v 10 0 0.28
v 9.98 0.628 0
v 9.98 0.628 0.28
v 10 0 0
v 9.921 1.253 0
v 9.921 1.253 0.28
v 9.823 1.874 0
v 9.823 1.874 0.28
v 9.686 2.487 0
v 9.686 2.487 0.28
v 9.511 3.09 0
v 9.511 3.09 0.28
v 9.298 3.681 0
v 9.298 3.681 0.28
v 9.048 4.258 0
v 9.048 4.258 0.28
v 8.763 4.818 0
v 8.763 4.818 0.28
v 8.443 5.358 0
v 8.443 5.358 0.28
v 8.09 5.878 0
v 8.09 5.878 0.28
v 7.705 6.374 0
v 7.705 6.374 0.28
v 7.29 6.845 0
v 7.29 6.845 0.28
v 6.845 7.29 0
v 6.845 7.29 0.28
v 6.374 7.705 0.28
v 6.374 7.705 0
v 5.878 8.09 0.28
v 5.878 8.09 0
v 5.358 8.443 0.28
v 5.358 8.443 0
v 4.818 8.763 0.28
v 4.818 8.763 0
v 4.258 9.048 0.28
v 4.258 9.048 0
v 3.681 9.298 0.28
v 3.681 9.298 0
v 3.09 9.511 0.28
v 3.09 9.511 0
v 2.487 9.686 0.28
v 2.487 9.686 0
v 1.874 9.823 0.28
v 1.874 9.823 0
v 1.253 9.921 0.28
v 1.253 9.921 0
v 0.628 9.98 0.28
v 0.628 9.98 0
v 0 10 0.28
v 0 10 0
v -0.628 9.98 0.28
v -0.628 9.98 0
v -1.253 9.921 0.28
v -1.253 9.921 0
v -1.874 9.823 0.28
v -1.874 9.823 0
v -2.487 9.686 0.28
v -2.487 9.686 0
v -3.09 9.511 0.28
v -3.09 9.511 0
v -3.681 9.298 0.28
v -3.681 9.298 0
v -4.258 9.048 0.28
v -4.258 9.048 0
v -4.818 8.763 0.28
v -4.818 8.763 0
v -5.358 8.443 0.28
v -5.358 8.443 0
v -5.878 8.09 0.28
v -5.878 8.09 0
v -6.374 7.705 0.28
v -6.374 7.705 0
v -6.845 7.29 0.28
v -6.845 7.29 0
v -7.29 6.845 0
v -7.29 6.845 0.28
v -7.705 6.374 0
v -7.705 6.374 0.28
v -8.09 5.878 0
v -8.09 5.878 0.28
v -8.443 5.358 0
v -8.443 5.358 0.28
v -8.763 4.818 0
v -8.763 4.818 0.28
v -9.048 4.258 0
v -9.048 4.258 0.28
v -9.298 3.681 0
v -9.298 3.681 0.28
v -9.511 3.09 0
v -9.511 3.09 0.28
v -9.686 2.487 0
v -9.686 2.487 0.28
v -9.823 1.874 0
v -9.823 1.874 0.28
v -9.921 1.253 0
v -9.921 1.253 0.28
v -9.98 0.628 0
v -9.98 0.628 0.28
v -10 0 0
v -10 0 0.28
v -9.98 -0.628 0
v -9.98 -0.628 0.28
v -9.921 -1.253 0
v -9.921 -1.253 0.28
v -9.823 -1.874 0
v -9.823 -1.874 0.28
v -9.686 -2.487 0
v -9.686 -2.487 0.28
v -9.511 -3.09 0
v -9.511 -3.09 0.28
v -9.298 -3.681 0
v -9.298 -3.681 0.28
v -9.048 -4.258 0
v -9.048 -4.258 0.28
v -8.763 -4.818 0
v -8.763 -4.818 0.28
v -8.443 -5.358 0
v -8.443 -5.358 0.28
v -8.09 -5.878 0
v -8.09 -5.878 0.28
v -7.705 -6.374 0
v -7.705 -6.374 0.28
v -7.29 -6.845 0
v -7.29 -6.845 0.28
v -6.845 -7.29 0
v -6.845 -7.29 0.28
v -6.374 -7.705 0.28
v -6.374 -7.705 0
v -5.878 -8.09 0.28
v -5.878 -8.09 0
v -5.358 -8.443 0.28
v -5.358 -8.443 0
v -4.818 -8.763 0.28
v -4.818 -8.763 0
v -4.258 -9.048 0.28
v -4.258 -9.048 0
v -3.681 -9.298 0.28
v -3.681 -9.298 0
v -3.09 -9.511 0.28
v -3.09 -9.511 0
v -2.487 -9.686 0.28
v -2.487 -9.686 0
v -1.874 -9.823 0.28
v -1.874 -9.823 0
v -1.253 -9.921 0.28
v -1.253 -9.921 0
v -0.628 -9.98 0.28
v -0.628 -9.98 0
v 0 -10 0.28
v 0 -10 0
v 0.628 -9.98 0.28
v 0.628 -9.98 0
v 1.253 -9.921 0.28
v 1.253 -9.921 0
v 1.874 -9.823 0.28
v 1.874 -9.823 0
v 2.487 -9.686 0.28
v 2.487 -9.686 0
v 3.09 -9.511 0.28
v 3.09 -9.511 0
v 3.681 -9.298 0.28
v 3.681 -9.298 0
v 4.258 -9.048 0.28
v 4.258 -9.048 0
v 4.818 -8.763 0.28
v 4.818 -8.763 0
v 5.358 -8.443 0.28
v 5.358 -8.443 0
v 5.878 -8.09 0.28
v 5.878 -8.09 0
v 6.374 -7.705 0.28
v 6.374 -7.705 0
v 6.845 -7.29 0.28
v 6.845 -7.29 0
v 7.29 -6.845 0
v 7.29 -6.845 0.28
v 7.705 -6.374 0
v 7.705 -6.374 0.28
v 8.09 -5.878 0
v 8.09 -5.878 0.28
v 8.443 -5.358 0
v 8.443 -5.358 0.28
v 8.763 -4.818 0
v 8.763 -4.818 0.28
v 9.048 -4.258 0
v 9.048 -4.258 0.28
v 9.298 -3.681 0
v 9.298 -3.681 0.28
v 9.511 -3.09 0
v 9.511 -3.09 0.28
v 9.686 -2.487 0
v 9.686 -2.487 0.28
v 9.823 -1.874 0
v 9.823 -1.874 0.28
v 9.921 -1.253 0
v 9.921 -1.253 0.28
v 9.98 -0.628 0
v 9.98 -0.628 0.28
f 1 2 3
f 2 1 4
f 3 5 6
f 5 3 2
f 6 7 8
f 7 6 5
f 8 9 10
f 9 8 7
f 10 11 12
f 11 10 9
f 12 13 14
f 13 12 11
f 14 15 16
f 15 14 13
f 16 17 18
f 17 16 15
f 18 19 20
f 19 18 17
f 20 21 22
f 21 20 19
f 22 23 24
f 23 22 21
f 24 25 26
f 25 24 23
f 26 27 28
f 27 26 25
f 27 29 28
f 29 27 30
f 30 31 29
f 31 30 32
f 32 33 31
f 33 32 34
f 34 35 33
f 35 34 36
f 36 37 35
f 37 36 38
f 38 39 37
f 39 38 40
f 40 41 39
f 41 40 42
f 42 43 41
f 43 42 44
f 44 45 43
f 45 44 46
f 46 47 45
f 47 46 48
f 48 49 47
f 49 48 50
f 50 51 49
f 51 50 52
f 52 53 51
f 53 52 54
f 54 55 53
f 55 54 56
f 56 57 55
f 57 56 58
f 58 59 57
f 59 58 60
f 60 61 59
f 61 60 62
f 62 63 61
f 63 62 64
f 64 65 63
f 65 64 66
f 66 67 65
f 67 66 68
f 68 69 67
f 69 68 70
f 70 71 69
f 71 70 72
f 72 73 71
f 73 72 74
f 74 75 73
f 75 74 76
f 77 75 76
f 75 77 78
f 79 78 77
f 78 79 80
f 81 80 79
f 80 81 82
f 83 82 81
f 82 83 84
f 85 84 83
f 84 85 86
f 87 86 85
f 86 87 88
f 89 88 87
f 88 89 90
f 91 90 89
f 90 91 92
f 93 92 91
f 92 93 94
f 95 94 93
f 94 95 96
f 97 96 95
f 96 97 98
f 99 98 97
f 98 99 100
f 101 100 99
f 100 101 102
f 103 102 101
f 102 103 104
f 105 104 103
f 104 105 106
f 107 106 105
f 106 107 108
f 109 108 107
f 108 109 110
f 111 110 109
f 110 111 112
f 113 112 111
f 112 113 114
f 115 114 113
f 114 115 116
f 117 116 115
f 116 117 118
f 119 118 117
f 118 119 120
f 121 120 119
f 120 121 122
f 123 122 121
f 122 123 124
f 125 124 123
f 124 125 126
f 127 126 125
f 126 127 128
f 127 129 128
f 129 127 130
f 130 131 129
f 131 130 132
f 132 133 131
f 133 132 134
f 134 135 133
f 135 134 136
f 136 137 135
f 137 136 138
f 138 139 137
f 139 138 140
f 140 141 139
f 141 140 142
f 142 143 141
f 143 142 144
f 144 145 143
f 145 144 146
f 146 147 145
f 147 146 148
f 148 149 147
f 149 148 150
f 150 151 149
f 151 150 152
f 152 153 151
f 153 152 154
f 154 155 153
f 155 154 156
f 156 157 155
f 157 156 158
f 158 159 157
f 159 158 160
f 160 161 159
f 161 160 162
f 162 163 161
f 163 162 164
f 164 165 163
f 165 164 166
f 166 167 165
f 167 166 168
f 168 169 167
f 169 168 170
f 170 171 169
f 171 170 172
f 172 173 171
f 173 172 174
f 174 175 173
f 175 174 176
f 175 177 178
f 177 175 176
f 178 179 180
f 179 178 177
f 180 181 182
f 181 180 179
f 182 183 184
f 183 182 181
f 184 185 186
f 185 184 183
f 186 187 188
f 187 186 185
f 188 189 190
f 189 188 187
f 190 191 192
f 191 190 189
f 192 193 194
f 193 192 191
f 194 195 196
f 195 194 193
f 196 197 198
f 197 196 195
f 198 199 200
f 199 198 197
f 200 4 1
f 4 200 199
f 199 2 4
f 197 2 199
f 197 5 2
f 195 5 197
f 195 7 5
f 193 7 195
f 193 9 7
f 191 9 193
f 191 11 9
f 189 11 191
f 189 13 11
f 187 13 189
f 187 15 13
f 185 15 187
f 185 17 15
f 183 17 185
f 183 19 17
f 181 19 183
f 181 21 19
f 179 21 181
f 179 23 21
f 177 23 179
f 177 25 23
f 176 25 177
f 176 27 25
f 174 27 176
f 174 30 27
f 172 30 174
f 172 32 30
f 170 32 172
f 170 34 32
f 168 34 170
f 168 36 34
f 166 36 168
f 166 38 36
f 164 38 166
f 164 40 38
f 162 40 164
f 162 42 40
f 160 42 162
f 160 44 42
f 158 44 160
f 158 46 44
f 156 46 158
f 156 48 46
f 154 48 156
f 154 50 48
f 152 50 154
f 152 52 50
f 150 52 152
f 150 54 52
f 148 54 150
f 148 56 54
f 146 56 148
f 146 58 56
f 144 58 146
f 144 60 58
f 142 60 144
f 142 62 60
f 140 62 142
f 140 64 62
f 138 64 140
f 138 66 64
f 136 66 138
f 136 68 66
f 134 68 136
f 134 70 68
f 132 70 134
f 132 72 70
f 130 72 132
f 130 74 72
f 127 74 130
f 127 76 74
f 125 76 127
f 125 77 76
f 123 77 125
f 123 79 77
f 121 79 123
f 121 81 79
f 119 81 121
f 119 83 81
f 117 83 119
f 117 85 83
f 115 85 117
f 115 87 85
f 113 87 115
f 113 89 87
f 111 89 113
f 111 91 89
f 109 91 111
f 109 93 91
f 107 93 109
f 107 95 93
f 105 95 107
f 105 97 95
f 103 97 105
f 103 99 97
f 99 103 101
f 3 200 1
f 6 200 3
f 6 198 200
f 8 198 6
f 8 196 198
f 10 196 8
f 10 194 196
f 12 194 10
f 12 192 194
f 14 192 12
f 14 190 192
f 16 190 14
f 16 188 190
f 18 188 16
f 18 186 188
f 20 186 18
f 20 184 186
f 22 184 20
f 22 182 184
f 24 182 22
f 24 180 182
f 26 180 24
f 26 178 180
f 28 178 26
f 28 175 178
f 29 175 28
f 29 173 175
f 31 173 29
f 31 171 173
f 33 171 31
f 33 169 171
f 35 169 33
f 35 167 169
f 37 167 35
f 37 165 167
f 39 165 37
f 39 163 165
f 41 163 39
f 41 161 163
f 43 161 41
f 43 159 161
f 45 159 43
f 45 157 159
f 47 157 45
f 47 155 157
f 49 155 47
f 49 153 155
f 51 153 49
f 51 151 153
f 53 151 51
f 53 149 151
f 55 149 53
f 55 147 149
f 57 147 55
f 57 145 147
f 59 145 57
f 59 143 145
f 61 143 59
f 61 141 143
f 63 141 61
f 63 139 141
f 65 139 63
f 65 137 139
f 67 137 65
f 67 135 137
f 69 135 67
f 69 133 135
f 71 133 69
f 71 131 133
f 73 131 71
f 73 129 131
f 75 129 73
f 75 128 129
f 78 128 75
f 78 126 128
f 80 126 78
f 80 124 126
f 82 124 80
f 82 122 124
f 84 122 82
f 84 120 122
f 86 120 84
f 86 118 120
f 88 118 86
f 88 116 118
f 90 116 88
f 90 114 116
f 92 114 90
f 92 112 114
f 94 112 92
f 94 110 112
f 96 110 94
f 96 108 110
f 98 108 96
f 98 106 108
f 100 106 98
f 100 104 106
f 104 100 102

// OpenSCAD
/* Hidden */
$fn=100;
bed_x=235;
bed_y=235;
layerh = 0.28;


module circle() {
	cylinder(h=layerh, d=20);
}
module line() {
    linear_extrude(height = 10, center = true, convexity = 10, twist = 0)
    {
        translate([2, 0, 0])
            circle(r = 1);    
    }
}

circle();
line();
